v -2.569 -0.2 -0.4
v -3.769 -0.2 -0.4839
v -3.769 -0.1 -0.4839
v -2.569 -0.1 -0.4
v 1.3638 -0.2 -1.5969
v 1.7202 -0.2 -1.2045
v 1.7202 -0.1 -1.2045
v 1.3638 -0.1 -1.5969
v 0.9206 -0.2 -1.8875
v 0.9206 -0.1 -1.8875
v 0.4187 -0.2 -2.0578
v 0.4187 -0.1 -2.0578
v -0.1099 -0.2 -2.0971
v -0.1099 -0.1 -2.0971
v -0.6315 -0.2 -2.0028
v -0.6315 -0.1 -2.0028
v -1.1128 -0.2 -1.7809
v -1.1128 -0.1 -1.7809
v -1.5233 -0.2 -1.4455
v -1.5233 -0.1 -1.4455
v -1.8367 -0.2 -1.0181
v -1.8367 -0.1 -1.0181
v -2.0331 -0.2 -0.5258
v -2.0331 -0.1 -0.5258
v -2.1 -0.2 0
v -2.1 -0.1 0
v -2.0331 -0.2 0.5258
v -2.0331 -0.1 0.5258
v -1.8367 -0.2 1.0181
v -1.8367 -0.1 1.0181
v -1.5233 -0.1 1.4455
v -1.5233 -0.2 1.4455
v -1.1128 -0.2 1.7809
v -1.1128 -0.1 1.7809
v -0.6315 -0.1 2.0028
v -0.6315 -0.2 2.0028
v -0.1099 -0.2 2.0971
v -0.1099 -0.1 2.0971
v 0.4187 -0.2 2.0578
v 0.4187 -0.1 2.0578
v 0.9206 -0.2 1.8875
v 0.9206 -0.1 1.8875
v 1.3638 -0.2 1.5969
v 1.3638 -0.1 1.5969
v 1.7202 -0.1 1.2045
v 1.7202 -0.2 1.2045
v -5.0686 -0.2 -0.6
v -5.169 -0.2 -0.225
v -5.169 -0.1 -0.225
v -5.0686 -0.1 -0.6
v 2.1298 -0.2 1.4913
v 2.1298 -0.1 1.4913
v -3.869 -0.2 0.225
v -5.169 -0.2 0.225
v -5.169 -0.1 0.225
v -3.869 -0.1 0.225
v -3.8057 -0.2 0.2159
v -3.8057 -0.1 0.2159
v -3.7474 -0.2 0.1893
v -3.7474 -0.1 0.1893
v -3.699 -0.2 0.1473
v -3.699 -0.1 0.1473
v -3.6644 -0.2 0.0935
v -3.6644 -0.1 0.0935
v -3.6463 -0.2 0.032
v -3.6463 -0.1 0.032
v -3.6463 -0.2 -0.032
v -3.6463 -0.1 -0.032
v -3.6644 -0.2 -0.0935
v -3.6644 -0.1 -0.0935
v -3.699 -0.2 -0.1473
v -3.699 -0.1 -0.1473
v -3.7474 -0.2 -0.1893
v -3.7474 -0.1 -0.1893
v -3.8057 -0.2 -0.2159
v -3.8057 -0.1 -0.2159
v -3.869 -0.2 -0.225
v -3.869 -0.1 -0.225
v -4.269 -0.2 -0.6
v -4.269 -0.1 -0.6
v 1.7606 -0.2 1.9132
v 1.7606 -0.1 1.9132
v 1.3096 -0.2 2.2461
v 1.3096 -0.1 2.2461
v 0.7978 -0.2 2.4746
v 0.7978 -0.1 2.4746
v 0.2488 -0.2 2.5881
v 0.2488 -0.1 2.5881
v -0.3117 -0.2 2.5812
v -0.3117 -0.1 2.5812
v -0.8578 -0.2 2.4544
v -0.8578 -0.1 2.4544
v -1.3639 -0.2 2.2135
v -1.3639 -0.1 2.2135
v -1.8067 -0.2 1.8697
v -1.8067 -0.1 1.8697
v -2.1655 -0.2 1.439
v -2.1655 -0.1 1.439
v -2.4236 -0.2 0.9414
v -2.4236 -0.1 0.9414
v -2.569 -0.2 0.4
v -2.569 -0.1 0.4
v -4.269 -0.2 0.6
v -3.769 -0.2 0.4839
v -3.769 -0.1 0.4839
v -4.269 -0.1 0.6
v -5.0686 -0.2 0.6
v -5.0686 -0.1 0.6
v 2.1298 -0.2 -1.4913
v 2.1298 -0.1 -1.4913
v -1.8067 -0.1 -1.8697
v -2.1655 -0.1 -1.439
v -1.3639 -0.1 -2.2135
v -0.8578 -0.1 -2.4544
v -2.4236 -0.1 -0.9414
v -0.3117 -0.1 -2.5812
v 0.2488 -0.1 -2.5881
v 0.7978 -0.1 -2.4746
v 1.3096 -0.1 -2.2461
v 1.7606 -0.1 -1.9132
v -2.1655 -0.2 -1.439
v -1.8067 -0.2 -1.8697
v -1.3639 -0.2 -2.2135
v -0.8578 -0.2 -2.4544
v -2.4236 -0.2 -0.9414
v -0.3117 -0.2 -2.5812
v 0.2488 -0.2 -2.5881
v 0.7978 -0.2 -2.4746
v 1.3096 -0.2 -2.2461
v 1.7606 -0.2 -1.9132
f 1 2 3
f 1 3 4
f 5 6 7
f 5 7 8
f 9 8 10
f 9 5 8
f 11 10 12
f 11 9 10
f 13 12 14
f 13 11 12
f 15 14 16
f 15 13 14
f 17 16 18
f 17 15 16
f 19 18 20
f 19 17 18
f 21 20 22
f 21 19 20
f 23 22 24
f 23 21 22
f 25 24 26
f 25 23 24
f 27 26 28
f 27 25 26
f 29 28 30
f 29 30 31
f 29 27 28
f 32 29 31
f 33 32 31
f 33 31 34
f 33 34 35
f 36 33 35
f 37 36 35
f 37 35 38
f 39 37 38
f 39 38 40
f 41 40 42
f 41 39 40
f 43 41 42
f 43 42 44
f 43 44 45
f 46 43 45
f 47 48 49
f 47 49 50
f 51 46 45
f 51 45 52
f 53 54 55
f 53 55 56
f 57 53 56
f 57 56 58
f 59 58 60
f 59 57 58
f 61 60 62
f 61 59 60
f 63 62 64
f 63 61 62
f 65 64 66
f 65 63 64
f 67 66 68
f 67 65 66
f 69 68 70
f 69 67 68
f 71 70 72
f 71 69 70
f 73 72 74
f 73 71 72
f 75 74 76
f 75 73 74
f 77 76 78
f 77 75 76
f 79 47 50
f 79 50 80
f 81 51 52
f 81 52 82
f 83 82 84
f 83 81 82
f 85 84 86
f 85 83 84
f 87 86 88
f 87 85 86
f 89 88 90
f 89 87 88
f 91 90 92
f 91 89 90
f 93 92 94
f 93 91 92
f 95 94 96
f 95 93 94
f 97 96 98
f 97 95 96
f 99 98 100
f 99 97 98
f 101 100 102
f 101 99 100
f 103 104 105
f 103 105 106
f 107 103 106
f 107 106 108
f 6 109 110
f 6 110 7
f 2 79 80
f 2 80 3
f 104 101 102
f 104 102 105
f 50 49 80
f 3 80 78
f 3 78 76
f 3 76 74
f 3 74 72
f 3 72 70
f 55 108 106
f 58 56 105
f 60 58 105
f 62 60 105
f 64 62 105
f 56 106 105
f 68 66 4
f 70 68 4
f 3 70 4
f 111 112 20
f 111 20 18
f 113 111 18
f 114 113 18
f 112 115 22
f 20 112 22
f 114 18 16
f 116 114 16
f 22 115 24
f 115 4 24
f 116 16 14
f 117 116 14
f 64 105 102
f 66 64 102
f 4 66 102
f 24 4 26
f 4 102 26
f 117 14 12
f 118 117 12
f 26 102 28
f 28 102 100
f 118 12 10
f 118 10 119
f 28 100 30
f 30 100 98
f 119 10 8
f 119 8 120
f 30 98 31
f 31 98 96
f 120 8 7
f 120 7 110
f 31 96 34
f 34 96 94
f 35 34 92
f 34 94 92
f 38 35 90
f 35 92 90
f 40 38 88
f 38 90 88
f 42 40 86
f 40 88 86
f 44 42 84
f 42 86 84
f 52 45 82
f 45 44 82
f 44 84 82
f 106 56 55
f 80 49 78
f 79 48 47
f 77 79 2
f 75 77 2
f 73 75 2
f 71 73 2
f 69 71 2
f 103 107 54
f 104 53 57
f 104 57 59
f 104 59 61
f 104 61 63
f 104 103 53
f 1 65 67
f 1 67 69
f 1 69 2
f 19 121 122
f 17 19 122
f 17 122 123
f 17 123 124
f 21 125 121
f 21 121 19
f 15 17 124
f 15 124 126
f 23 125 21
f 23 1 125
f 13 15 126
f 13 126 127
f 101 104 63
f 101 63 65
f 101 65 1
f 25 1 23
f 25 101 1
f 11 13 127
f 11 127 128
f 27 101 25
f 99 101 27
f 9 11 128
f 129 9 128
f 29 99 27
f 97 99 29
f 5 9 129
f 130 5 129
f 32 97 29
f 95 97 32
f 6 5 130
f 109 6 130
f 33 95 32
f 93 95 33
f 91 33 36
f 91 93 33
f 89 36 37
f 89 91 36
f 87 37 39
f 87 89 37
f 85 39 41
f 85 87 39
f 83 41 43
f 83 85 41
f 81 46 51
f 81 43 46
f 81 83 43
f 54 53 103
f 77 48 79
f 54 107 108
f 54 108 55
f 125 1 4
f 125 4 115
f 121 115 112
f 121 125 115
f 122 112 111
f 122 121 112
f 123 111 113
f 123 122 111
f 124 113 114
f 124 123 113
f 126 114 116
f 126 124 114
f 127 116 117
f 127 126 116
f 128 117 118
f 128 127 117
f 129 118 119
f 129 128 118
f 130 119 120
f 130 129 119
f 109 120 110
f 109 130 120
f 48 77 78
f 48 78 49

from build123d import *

# Parameters (mm, degrees)
BOSS_EXTRUDE1_DEPTH = 0.1


with BuildPart() as part:
    # Sketch1 → Boss-Extrude1 (new body)
    with BuildSketch(Plane.XZ.offset(0.2)):
        with BuildLine():
            Line((1.720219293, 1.204510516), (2.129795315, 1.491298735))
            ThreePointArc((2.129795315, 1.491298735), (-0.588190986, 2.532593802), (-2.569046516, 0.4))
            Line((-2.569046516, 0.4), (-3.769046516, 0.483912174))
            Line((-3.769046516, 0.483912174), (-4.269046516, 0.6))
            Line((-4.269046516, 0.6), (-5.068565569, 0.6))
            Line((-5.068565569, 0.6), (-5.169046516, 0.225))
            Line((-5.169046516, 0.225), (-3.869046516, 0.225))
            ThreePointArc((-3.869046516, 0.225), (-3.644046516, 0), (-3.869046516, -0.225))
            Line((-3.869046516, -0.225), (-5.169046516, -0.225))
            Line((-5.169046516, -0.225), (-5.068565569, -0.6))
            Line((-5.068565569, -0.6), (-4.269046516, -0.6))
            Line((-4.269046516, -0.6), (-3.769046516, -0.483912174))
            Line((-3.769046516, -0.483912174), (-2.569046516, -0.4))
            ThreePointArc((-2.569046516, -0.4), (-0.588190986, -2.532593802), (2.129795315, -1.491298735))
            Line((2.129795315, -1.491298735), (1.720219293, -1.204510516))
            ThreePointArc((1.720219293, -1.204510516), (-2.1, 0), (1.720219293, 1.204510516))
        make_face()
    extrude(amount=-BOSS_EXTRUDE1_DEPTH)


solid = part.part
